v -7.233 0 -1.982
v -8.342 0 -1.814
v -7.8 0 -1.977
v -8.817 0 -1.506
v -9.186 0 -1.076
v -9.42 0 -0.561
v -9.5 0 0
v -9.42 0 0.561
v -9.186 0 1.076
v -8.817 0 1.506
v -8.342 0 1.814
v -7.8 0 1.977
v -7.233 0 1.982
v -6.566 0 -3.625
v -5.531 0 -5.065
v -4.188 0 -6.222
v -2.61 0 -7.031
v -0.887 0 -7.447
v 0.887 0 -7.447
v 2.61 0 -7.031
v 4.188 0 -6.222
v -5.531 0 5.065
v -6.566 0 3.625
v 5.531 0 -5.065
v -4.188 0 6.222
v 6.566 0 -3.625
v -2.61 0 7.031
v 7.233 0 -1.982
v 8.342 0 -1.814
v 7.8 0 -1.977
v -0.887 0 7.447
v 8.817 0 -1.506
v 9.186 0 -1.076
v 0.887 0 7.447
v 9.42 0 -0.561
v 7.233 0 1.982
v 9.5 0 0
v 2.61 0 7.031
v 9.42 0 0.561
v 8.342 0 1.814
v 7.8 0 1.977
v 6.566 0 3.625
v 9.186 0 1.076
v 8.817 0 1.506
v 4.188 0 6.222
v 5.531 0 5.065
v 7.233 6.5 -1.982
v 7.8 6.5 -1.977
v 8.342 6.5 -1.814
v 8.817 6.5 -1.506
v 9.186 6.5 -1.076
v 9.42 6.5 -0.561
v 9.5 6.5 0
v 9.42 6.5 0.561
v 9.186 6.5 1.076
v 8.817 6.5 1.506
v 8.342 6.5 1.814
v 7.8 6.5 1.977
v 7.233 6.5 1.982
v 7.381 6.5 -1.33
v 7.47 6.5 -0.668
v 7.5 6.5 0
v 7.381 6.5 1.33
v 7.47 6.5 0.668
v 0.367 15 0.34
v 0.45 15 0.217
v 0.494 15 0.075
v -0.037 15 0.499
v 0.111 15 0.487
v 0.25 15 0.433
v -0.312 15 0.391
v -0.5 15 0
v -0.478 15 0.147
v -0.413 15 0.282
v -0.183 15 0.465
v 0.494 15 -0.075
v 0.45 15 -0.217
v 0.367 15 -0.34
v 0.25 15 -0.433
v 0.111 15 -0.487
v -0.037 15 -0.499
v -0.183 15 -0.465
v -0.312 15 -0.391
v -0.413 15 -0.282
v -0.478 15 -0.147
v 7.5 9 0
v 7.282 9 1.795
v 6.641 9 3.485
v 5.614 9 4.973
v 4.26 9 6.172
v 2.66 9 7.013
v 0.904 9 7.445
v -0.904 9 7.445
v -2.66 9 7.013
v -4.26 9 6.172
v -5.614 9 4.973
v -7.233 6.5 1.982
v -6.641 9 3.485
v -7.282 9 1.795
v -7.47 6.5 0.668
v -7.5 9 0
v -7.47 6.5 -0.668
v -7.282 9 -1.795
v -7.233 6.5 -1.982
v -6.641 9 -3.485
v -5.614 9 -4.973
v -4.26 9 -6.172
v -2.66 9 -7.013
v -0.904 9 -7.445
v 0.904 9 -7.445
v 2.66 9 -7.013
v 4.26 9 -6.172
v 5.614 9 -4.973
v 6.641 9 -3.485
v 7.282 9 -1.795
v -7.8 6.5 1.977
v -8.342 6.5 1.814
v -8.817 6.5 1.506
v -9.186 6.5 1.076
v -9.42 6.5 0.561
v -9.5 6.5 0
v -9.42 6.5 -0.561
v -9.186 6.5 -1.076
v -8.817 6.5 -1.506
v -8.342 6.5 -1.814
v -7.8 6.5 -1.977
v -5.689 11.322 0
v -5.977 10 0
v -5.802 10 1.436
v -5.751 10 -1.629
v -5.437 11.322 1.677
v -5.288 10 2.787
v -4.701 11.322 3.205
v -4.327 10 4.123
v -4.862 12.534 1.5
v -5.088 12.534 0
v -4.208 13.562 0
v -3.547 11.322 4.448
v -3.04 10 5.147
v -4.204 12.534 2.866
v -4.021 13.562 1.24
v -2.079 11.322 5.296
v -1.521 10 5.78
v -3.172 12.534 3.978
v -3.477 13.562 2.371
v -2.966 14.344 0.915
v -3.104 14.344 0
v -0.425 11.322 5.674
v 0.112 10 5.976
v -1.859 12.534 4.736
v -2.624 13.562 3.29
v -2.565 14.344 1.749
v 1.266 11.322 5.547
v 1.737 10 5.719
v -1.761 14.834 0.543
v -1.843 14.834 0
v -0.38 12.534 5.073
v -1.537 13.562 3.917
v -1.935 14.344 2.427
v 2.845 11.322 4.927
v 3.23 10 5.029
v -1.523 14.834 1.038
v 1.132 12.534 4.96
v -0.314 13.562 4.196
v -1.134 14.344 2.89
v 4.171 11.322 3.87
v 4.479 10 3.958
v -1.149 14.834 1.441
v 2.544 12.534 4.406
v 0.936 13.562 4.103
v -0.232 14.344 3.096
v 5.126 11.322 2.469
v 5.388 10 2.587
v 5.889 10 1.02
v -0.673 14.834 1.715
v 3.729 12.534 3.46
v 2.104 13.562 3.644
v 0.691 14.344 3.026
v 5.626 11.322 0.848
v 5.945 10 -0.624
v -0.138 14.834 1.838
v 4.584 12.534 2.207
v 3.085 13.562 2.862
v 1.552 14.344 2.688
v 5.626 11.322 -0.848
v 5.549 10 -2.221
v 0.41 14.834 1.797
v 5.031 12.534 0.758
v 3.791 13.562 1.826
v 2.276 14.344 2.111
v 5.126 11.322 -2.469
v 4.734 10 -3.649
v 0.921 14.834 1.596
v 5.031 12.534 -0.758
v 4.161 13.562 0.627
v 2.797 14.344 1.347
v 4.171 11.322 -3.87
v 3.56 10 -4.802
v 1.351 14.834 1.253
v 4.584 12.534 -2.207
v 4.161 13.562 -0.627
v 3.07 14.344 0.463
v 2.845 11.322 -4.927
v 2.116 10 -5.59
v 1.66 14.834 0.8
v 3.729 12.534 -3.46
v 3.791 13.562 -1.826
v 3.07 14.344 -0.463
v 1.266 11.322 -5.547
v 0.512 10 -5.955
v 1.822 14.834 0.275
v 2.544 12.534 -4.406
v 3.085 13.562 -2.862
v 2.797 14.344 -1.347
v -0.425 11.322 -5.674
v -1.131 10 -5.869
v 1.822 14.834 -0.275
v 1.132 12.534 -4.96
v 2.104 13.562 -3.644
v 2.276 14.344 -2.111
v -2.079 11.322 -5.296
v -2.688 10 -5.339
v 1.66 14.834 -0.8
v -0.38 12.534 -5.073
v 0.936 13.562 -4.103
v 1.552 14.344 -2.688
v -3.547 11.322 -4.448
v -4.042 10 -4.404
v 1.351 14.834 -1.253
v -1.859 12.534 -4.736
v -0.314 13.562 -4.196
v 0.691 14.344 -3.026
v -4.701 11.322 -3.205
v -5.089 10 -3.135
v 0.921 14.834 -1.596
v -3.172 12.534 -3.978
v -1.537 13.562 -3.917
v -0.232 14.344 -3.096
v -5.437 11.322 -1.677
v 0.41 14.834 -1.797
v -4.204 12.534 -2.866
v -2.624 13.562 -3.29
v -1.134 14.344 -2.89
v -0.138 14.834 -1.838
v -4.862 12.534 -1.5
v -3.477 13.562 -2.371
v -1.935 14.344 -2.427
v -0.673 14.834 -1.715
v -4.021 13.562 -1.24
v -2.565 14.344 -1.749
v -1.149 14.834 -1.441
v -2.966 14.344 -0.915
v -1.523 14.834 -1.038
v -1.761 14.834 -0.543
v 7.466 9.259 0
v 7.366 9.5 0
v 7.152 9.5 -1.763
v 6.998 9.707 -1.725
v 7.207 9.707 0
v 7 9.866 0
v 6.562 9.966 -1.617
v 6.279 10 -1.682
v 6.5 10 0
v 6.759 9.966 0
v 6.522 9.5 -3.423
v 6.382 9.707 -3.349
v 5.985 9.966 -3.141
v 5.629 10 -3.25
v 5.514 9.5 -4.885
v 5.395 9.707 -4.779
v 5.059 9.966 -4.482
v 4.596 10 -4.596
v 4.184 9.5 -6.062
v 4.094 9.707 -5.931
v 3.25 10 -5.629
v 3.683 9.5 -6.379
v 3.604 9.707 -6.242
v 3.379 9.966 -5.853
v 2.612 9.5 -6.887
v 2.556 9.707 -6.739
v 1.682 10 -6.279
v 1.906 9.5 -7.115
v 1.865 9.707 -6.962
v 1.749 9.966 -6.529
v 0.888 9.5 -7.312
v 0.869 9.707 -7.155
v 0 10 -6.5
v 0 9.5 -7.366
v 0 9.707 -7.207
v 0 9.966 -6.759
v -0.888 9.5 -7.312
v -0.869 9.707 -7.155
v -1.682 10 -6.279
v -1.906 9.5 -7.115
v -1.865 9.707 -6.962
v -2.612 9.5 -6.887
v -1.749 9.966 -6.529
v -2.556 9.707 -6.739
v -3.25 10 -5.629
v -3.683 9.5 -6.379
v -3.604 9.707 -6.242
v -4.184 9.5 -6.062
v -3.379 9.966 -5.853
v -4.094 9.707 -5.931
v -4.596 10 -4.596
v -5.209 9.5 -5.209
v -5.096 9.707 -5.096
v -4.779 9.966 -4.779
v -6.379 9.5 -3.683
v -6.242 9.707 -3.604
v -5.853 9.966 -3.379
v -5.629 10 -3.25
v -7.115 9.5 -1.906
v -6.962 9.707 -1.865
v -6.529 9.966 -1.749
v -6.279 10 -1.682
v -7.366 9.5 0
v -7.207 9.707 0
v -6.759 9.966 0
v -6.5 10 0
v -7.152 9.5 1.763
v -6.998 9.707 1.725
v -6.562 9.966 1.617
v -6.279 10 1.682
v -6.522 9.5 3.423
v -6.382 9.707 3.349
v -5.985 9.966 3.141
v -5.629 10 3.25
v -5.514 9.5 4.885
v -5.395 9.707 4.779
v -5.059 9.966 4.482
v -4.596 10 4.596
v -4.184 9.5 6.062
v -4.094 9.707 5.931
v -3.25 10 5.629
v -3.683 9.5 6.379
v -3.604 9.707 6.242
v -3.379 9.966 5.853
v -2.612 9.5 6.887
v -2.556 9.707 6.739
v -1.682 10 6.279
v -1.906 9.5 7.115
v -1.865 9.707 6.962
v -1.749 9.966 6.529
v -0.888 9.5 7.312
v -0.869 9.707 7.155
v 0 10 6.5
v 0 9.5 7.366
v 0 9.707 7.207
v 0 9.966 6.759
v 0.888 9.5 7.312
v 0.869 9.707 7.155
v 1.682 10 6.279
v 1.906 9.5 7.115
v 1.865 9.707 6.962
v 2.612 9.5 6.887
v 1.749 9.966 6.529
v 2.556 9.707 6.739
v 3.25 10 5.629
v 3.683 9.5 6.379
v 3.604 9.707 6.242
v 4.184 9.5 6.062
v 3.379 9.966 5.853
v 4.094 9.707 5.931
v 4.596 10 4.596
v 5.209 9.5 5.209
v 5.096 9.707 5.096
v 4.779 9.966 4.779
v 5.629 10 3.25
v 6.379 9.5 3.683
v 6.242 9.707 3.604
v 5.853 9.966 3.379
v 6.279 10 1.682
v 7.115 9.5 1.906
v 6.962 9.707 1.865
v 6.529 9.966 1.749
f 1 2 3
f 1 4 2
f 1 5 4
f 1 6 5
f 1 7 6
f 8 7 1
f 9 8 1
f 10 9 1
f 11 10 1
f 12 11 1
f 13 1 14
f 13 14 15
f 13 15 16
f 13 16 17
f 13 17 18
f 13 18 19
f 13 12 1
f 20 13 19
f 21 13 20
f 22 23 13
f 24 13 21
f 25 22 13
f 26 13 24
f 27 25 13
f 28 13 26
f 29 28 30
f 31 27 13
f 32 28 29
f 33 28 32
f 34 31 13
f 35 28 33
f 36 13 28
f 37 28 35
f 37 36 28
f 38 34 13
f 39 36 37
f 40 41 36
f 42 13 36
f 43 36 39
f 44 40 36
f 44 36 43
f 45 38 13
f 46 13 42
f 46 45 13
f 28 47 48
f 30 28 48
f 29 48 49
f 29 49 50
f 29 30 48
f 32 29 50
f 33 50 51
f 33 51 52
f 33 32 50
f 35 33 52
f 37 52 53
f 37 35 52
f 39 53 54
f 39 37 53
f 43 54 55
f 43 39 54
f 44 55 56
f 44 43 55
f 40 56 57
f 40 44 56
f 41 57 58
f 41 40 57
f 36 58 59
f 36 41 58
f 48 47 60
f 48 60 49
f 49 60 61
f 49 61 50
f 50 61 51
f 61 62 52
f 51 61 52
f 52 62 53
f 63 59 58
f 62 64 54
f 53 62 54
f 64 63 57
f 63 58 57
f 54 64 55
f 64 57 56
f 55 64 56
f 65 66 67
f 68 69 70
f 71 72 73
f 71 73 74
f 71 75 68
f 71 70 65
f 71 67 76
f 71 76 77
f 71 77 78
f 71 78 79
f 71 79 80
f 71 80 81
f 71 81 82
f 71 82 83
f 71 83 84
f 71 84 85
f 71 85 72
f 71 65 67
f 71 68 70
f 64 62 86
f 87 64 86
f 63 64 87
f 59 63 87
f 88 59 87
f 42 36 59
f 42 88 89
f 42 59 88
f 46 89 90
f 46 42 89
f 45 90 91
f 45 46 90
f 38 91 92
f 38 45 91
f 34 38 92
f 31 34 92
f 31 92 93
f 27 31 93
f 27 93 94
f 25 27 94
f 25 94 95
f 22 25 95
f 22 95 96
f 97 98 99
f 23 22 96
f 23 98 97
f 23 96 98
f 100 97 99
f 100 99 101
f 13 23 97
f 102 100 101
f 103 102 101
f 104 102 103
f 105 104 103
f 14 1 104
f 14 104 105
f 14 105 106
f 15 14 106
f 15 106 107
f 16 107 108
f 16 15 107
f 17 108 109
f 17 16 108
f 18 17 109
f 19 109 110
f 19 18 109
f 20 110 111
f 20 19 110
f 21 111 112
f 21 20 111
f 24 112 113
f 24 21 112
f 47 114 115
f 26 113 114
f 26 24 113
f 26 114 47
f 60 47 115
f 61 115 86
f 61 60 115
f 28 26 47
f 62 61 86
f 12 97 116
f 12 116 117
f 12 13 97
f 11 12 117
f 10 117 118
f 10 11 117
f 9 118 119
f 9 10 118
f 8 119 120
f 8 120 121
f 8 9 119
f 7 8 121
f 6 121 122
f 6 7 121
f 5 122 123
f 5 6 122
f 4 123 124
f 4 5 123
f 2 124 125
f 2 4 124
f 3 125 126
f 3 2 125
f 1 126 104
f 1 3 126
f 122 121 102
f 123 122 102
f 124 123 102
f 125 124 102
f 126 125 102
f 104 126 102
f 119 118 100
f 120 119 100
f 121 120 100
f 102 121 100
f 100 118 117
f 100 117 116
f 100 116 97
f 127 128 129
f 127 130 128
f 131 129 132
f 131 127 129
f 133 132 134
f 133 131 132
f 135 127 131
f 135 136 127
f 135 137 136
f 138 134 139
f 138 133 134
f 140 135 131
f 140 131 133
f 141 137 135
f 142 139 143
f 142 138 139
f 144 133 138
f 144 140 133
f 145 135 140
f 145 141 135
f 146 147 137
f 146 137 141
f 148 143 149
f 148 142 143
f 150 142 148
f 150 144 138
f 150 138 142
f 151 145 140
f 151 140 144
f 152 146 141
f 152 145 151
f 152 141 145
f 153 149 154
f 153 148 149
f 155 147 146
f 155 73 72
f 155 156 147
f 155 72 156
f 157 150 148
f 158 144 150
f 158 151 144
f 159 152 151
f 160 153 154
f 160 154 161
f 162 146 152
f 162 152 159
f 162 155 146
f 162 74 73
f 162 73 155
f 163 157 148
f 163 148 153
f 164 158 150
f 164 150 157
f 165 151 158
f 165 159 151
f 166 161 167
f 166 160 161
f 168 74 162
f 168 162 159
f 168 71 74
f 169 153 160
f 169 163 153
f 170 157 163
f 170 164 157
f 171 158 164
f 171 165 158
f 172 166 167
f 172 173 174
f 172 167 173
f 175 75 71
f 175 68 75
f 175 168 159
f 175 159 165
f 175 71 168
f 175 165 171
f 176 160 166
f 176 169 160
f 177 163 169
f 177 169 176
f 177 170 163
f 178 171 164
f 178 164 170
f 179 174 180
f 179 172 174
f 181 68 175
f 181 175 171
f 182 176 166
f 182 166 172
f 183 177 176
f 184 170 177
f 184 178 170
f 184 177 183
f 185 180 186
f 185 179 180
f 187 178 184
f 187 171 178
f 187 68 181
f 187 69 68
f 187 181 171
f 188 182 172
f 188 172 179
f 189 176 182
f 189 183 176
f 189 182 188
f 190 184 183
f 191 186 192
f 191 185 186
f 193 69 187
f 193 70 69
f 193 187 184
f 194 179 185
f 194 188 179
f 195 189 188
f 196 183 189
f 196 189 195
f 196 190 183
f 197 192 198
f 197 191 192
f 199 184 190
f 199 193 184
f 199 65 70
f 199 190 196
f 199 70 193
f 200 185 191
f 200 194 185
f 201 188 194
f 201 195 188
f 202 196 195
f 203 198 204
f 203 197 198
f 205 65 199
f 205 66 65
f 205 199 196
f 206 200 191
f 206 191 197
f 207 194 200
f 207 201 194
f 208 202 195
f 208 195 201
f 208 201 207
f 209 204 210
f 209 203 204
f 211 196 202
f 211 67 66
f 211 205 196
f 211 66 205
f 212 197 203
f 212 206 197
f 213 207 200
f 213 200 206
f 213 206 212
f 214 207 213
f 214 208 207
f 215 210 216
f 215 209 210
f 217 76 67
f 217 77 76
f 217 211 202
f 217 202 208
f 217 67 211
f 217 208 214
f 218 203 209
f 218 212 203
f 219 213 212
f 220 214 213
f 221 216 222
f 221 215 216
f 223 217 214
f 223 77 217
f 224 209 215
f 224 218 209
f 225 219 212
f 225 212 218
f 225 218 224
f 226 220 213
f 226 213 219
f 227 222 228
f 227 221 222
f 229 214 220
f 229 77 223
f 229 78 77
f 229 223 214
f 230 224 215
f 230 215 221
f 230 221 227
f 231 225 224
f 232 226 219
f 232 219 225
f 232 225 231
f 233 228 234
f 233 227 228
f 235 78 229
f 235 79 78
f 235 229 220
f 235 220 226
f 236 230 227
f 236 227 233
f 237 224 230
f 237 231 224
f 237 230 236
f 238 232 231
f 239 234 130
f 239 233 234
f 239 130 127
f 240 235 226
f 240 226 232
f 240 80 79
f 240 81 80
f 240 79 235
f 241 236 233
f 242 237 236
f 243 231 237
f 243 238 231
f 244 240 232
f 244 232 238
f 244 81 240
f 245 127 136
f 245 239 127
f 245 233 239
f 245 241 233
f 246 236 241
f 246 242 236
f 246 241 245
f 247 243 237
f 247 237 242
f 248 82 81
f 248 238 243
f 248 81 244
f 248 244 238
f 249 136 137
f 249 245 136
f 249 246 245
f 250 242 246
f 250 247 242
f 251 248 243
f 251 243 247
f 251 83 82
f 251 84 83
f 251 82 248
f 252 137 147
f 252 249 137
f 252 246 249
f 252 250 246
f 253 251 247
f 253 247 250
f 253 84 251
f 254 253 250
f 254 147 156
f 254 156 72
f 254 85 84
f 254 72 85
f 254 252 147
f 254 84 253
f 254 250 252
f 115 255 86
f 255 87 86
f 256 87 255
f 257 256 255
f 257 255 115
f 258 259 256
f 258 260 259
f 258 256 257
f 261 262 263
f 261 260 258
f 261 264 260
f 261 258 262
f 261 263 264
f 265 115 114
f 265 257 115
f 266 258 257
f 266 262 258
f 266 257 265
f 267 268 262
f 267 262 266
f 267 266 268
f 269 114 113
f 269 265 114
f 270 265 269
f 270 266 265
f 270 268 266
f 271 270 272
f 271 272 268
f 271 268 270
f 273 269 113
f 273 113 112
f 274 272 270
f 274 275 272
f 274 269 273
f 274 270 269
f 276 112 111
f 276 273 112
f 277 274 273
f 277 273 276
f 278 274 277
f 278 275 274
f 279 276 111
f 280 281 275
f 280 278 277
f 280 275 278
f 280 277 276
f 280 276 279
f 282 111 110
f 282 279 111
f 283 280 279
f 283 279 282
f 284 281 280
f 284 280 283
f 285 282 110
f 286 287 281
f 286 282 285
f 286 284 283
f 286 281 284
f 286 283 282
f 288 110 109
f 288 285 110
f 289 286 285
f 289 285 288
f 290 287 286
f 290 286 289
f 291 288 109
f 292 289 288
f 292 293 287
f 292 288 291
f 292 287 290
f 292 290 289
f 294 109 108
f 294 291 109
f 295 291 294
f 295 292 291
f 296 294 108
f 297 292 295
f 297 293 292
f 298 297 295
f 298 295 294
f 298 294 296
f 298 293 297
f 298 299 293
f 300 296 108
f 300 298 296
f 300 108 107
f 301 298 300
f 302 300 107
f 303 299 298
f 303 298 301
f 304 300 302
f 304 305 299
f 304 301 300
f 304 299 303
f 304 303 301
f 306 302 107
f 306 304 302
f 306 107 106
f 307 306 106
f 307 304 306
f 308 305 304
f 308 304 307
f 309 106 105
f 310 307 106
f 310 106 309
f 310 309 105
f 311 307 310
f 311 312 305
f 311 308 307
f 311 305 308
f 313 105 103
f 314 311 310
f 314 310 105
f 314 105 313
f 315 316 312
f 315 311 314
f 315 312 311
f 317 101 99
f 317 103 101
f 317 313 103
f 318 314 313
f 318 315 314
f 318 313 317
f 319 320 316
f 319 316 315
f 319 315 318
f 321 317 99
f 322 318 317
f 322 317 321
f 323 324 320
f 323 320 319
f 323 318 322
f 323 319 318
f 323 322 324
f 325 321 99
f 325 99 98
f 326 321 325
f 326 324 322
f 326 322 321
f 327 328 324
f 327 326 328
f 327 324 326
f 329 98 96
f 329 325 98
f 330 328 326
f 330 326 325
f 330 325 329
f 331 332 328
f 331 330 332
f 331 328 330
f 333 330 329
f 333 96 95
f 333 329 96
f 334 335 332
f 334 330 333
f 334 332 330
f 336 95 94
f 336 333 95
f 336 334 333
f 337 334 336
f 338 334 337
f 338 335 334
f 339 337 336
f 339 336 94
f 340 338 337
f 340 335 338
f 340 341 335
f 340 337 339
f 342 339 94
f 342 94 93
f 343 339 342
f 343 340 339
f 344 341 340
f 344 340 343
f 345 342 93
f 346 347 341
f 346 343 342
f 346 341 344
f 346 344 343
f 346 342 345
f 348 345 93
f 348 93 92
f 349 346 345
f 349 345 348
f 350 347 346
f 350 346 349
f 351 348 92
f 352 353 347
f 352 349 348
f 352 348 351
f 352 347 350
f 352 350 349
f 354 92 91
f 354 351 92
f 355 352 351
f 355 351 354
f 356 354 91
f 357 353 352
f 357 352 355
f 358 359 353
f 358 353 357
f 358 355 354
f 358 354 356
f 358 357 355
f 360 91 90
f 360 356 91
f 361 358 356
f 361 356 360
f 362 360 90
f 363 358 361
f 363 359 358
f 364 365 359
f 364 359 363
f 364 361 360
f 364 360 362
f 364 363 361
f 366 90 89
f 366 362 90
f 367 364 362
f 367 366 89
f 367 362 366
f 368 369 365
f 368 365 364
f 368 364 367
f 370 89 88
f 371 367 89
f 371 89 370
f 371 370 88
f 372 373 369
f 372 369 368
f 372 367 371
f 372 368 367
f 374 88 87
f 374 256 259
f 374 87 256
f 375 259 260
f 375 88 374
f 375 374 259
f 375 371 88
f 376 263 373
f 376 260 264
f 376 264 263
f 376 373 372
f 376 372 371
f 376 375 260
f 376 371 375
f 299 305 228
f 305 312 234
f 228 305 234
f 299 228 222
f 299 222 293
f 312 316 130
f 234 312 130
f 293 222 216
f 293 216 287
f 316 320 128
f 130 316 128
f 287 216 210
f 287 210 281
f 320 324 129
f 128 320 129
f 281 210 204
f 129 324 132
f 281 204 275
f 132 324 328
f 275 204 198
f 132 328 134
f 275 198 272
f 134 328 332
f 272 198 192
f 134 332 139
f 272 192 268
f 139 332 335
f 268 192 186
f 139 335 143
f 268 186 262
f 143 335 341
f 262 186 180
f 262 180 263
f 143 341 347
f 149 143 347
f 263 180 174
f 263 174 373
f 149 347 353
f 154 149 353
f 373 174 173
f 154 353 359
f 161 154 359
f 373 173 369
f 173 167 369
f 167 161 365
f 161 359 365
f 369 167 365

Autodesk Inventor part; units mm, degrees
ref_plane "YZ Plane" through (0, 0, 0) normal (1, 0, 0) x (0, 1, 0)
ref_plane "XZ Plane" through (0, 0, 0) normal (0, 1, 0) x (-1, 0, 0)
ref_plane "XY Plane" through (0, 0, 0) normal (0, 0, 1) x (1, 0, 0)
sketch "Boceto1" plane through (0, 0, 0) normal (0, 1, 0) x (-1, 0, 0)
  circle A0 centre (0, 0) radius 6
  dimension "d0" = 0
  dimension "d1" = 0
  dimension "d2" = 12
extrude "Extrusión1" add sketch "Boceto1" along normal blind 15
fillet "Empalme1" radius 5.5 1 edges at (6, 15, 0)
sketch "Boceto2" plane through (0, 0, 0) normal (0, -1, 0) x (1, 0, 0)
  circle A0 centre (0, 0) radius 7.5
  dimension "d6" = 15
extrude "Extrusión2" add sketch "Boceto2" against normal blind 10
fillet "Empalme2" radius 1 1 edges at (-7.5, 10, 0)
sketch "Boceto3" plane through (0, 0, 0) normal (0, -1, 0) x (1, 0, 0)
  circle A0 centre (0, 0) radius 6.5 projected
  circle A1 centre (7.5, 0) radius 2
  circle A2 centre (-7.5, 0) radius 2
  dimension "d10" = 7.5
  dimension "d12" = 4
  dimension "d14" = 7.5
  dimension "d15" = 4
extrude "Extrusión3" add sketch "Boceto3" against normal blind 6.5 contours A0 A1 | A0 A1 | A2 A0 | A0 A2
equation "\"Radio_pliegue\" = Grosor"
equation "\"Anchura_desahogo_plegado\" = Grosor"
equation "\"Profundidad_desahogo_plegado\" = 0.5 * Grosor"
equation "\"Tamaño_destalonado\" = 4 * Grosor"
equation "\"Remanente_mínimo\" = 2 * Grosor"
equation "\"Radiodetransición\" = Radio_pliegue"
equation "\"Tamaño_de_radio_de_Jacobi\" = Radio_pliegue"
equation "\"TamañoSeparación\" = Grosor"
equation "\"Grosor\" = 0.5"
properties part number "Rueda Loca"
